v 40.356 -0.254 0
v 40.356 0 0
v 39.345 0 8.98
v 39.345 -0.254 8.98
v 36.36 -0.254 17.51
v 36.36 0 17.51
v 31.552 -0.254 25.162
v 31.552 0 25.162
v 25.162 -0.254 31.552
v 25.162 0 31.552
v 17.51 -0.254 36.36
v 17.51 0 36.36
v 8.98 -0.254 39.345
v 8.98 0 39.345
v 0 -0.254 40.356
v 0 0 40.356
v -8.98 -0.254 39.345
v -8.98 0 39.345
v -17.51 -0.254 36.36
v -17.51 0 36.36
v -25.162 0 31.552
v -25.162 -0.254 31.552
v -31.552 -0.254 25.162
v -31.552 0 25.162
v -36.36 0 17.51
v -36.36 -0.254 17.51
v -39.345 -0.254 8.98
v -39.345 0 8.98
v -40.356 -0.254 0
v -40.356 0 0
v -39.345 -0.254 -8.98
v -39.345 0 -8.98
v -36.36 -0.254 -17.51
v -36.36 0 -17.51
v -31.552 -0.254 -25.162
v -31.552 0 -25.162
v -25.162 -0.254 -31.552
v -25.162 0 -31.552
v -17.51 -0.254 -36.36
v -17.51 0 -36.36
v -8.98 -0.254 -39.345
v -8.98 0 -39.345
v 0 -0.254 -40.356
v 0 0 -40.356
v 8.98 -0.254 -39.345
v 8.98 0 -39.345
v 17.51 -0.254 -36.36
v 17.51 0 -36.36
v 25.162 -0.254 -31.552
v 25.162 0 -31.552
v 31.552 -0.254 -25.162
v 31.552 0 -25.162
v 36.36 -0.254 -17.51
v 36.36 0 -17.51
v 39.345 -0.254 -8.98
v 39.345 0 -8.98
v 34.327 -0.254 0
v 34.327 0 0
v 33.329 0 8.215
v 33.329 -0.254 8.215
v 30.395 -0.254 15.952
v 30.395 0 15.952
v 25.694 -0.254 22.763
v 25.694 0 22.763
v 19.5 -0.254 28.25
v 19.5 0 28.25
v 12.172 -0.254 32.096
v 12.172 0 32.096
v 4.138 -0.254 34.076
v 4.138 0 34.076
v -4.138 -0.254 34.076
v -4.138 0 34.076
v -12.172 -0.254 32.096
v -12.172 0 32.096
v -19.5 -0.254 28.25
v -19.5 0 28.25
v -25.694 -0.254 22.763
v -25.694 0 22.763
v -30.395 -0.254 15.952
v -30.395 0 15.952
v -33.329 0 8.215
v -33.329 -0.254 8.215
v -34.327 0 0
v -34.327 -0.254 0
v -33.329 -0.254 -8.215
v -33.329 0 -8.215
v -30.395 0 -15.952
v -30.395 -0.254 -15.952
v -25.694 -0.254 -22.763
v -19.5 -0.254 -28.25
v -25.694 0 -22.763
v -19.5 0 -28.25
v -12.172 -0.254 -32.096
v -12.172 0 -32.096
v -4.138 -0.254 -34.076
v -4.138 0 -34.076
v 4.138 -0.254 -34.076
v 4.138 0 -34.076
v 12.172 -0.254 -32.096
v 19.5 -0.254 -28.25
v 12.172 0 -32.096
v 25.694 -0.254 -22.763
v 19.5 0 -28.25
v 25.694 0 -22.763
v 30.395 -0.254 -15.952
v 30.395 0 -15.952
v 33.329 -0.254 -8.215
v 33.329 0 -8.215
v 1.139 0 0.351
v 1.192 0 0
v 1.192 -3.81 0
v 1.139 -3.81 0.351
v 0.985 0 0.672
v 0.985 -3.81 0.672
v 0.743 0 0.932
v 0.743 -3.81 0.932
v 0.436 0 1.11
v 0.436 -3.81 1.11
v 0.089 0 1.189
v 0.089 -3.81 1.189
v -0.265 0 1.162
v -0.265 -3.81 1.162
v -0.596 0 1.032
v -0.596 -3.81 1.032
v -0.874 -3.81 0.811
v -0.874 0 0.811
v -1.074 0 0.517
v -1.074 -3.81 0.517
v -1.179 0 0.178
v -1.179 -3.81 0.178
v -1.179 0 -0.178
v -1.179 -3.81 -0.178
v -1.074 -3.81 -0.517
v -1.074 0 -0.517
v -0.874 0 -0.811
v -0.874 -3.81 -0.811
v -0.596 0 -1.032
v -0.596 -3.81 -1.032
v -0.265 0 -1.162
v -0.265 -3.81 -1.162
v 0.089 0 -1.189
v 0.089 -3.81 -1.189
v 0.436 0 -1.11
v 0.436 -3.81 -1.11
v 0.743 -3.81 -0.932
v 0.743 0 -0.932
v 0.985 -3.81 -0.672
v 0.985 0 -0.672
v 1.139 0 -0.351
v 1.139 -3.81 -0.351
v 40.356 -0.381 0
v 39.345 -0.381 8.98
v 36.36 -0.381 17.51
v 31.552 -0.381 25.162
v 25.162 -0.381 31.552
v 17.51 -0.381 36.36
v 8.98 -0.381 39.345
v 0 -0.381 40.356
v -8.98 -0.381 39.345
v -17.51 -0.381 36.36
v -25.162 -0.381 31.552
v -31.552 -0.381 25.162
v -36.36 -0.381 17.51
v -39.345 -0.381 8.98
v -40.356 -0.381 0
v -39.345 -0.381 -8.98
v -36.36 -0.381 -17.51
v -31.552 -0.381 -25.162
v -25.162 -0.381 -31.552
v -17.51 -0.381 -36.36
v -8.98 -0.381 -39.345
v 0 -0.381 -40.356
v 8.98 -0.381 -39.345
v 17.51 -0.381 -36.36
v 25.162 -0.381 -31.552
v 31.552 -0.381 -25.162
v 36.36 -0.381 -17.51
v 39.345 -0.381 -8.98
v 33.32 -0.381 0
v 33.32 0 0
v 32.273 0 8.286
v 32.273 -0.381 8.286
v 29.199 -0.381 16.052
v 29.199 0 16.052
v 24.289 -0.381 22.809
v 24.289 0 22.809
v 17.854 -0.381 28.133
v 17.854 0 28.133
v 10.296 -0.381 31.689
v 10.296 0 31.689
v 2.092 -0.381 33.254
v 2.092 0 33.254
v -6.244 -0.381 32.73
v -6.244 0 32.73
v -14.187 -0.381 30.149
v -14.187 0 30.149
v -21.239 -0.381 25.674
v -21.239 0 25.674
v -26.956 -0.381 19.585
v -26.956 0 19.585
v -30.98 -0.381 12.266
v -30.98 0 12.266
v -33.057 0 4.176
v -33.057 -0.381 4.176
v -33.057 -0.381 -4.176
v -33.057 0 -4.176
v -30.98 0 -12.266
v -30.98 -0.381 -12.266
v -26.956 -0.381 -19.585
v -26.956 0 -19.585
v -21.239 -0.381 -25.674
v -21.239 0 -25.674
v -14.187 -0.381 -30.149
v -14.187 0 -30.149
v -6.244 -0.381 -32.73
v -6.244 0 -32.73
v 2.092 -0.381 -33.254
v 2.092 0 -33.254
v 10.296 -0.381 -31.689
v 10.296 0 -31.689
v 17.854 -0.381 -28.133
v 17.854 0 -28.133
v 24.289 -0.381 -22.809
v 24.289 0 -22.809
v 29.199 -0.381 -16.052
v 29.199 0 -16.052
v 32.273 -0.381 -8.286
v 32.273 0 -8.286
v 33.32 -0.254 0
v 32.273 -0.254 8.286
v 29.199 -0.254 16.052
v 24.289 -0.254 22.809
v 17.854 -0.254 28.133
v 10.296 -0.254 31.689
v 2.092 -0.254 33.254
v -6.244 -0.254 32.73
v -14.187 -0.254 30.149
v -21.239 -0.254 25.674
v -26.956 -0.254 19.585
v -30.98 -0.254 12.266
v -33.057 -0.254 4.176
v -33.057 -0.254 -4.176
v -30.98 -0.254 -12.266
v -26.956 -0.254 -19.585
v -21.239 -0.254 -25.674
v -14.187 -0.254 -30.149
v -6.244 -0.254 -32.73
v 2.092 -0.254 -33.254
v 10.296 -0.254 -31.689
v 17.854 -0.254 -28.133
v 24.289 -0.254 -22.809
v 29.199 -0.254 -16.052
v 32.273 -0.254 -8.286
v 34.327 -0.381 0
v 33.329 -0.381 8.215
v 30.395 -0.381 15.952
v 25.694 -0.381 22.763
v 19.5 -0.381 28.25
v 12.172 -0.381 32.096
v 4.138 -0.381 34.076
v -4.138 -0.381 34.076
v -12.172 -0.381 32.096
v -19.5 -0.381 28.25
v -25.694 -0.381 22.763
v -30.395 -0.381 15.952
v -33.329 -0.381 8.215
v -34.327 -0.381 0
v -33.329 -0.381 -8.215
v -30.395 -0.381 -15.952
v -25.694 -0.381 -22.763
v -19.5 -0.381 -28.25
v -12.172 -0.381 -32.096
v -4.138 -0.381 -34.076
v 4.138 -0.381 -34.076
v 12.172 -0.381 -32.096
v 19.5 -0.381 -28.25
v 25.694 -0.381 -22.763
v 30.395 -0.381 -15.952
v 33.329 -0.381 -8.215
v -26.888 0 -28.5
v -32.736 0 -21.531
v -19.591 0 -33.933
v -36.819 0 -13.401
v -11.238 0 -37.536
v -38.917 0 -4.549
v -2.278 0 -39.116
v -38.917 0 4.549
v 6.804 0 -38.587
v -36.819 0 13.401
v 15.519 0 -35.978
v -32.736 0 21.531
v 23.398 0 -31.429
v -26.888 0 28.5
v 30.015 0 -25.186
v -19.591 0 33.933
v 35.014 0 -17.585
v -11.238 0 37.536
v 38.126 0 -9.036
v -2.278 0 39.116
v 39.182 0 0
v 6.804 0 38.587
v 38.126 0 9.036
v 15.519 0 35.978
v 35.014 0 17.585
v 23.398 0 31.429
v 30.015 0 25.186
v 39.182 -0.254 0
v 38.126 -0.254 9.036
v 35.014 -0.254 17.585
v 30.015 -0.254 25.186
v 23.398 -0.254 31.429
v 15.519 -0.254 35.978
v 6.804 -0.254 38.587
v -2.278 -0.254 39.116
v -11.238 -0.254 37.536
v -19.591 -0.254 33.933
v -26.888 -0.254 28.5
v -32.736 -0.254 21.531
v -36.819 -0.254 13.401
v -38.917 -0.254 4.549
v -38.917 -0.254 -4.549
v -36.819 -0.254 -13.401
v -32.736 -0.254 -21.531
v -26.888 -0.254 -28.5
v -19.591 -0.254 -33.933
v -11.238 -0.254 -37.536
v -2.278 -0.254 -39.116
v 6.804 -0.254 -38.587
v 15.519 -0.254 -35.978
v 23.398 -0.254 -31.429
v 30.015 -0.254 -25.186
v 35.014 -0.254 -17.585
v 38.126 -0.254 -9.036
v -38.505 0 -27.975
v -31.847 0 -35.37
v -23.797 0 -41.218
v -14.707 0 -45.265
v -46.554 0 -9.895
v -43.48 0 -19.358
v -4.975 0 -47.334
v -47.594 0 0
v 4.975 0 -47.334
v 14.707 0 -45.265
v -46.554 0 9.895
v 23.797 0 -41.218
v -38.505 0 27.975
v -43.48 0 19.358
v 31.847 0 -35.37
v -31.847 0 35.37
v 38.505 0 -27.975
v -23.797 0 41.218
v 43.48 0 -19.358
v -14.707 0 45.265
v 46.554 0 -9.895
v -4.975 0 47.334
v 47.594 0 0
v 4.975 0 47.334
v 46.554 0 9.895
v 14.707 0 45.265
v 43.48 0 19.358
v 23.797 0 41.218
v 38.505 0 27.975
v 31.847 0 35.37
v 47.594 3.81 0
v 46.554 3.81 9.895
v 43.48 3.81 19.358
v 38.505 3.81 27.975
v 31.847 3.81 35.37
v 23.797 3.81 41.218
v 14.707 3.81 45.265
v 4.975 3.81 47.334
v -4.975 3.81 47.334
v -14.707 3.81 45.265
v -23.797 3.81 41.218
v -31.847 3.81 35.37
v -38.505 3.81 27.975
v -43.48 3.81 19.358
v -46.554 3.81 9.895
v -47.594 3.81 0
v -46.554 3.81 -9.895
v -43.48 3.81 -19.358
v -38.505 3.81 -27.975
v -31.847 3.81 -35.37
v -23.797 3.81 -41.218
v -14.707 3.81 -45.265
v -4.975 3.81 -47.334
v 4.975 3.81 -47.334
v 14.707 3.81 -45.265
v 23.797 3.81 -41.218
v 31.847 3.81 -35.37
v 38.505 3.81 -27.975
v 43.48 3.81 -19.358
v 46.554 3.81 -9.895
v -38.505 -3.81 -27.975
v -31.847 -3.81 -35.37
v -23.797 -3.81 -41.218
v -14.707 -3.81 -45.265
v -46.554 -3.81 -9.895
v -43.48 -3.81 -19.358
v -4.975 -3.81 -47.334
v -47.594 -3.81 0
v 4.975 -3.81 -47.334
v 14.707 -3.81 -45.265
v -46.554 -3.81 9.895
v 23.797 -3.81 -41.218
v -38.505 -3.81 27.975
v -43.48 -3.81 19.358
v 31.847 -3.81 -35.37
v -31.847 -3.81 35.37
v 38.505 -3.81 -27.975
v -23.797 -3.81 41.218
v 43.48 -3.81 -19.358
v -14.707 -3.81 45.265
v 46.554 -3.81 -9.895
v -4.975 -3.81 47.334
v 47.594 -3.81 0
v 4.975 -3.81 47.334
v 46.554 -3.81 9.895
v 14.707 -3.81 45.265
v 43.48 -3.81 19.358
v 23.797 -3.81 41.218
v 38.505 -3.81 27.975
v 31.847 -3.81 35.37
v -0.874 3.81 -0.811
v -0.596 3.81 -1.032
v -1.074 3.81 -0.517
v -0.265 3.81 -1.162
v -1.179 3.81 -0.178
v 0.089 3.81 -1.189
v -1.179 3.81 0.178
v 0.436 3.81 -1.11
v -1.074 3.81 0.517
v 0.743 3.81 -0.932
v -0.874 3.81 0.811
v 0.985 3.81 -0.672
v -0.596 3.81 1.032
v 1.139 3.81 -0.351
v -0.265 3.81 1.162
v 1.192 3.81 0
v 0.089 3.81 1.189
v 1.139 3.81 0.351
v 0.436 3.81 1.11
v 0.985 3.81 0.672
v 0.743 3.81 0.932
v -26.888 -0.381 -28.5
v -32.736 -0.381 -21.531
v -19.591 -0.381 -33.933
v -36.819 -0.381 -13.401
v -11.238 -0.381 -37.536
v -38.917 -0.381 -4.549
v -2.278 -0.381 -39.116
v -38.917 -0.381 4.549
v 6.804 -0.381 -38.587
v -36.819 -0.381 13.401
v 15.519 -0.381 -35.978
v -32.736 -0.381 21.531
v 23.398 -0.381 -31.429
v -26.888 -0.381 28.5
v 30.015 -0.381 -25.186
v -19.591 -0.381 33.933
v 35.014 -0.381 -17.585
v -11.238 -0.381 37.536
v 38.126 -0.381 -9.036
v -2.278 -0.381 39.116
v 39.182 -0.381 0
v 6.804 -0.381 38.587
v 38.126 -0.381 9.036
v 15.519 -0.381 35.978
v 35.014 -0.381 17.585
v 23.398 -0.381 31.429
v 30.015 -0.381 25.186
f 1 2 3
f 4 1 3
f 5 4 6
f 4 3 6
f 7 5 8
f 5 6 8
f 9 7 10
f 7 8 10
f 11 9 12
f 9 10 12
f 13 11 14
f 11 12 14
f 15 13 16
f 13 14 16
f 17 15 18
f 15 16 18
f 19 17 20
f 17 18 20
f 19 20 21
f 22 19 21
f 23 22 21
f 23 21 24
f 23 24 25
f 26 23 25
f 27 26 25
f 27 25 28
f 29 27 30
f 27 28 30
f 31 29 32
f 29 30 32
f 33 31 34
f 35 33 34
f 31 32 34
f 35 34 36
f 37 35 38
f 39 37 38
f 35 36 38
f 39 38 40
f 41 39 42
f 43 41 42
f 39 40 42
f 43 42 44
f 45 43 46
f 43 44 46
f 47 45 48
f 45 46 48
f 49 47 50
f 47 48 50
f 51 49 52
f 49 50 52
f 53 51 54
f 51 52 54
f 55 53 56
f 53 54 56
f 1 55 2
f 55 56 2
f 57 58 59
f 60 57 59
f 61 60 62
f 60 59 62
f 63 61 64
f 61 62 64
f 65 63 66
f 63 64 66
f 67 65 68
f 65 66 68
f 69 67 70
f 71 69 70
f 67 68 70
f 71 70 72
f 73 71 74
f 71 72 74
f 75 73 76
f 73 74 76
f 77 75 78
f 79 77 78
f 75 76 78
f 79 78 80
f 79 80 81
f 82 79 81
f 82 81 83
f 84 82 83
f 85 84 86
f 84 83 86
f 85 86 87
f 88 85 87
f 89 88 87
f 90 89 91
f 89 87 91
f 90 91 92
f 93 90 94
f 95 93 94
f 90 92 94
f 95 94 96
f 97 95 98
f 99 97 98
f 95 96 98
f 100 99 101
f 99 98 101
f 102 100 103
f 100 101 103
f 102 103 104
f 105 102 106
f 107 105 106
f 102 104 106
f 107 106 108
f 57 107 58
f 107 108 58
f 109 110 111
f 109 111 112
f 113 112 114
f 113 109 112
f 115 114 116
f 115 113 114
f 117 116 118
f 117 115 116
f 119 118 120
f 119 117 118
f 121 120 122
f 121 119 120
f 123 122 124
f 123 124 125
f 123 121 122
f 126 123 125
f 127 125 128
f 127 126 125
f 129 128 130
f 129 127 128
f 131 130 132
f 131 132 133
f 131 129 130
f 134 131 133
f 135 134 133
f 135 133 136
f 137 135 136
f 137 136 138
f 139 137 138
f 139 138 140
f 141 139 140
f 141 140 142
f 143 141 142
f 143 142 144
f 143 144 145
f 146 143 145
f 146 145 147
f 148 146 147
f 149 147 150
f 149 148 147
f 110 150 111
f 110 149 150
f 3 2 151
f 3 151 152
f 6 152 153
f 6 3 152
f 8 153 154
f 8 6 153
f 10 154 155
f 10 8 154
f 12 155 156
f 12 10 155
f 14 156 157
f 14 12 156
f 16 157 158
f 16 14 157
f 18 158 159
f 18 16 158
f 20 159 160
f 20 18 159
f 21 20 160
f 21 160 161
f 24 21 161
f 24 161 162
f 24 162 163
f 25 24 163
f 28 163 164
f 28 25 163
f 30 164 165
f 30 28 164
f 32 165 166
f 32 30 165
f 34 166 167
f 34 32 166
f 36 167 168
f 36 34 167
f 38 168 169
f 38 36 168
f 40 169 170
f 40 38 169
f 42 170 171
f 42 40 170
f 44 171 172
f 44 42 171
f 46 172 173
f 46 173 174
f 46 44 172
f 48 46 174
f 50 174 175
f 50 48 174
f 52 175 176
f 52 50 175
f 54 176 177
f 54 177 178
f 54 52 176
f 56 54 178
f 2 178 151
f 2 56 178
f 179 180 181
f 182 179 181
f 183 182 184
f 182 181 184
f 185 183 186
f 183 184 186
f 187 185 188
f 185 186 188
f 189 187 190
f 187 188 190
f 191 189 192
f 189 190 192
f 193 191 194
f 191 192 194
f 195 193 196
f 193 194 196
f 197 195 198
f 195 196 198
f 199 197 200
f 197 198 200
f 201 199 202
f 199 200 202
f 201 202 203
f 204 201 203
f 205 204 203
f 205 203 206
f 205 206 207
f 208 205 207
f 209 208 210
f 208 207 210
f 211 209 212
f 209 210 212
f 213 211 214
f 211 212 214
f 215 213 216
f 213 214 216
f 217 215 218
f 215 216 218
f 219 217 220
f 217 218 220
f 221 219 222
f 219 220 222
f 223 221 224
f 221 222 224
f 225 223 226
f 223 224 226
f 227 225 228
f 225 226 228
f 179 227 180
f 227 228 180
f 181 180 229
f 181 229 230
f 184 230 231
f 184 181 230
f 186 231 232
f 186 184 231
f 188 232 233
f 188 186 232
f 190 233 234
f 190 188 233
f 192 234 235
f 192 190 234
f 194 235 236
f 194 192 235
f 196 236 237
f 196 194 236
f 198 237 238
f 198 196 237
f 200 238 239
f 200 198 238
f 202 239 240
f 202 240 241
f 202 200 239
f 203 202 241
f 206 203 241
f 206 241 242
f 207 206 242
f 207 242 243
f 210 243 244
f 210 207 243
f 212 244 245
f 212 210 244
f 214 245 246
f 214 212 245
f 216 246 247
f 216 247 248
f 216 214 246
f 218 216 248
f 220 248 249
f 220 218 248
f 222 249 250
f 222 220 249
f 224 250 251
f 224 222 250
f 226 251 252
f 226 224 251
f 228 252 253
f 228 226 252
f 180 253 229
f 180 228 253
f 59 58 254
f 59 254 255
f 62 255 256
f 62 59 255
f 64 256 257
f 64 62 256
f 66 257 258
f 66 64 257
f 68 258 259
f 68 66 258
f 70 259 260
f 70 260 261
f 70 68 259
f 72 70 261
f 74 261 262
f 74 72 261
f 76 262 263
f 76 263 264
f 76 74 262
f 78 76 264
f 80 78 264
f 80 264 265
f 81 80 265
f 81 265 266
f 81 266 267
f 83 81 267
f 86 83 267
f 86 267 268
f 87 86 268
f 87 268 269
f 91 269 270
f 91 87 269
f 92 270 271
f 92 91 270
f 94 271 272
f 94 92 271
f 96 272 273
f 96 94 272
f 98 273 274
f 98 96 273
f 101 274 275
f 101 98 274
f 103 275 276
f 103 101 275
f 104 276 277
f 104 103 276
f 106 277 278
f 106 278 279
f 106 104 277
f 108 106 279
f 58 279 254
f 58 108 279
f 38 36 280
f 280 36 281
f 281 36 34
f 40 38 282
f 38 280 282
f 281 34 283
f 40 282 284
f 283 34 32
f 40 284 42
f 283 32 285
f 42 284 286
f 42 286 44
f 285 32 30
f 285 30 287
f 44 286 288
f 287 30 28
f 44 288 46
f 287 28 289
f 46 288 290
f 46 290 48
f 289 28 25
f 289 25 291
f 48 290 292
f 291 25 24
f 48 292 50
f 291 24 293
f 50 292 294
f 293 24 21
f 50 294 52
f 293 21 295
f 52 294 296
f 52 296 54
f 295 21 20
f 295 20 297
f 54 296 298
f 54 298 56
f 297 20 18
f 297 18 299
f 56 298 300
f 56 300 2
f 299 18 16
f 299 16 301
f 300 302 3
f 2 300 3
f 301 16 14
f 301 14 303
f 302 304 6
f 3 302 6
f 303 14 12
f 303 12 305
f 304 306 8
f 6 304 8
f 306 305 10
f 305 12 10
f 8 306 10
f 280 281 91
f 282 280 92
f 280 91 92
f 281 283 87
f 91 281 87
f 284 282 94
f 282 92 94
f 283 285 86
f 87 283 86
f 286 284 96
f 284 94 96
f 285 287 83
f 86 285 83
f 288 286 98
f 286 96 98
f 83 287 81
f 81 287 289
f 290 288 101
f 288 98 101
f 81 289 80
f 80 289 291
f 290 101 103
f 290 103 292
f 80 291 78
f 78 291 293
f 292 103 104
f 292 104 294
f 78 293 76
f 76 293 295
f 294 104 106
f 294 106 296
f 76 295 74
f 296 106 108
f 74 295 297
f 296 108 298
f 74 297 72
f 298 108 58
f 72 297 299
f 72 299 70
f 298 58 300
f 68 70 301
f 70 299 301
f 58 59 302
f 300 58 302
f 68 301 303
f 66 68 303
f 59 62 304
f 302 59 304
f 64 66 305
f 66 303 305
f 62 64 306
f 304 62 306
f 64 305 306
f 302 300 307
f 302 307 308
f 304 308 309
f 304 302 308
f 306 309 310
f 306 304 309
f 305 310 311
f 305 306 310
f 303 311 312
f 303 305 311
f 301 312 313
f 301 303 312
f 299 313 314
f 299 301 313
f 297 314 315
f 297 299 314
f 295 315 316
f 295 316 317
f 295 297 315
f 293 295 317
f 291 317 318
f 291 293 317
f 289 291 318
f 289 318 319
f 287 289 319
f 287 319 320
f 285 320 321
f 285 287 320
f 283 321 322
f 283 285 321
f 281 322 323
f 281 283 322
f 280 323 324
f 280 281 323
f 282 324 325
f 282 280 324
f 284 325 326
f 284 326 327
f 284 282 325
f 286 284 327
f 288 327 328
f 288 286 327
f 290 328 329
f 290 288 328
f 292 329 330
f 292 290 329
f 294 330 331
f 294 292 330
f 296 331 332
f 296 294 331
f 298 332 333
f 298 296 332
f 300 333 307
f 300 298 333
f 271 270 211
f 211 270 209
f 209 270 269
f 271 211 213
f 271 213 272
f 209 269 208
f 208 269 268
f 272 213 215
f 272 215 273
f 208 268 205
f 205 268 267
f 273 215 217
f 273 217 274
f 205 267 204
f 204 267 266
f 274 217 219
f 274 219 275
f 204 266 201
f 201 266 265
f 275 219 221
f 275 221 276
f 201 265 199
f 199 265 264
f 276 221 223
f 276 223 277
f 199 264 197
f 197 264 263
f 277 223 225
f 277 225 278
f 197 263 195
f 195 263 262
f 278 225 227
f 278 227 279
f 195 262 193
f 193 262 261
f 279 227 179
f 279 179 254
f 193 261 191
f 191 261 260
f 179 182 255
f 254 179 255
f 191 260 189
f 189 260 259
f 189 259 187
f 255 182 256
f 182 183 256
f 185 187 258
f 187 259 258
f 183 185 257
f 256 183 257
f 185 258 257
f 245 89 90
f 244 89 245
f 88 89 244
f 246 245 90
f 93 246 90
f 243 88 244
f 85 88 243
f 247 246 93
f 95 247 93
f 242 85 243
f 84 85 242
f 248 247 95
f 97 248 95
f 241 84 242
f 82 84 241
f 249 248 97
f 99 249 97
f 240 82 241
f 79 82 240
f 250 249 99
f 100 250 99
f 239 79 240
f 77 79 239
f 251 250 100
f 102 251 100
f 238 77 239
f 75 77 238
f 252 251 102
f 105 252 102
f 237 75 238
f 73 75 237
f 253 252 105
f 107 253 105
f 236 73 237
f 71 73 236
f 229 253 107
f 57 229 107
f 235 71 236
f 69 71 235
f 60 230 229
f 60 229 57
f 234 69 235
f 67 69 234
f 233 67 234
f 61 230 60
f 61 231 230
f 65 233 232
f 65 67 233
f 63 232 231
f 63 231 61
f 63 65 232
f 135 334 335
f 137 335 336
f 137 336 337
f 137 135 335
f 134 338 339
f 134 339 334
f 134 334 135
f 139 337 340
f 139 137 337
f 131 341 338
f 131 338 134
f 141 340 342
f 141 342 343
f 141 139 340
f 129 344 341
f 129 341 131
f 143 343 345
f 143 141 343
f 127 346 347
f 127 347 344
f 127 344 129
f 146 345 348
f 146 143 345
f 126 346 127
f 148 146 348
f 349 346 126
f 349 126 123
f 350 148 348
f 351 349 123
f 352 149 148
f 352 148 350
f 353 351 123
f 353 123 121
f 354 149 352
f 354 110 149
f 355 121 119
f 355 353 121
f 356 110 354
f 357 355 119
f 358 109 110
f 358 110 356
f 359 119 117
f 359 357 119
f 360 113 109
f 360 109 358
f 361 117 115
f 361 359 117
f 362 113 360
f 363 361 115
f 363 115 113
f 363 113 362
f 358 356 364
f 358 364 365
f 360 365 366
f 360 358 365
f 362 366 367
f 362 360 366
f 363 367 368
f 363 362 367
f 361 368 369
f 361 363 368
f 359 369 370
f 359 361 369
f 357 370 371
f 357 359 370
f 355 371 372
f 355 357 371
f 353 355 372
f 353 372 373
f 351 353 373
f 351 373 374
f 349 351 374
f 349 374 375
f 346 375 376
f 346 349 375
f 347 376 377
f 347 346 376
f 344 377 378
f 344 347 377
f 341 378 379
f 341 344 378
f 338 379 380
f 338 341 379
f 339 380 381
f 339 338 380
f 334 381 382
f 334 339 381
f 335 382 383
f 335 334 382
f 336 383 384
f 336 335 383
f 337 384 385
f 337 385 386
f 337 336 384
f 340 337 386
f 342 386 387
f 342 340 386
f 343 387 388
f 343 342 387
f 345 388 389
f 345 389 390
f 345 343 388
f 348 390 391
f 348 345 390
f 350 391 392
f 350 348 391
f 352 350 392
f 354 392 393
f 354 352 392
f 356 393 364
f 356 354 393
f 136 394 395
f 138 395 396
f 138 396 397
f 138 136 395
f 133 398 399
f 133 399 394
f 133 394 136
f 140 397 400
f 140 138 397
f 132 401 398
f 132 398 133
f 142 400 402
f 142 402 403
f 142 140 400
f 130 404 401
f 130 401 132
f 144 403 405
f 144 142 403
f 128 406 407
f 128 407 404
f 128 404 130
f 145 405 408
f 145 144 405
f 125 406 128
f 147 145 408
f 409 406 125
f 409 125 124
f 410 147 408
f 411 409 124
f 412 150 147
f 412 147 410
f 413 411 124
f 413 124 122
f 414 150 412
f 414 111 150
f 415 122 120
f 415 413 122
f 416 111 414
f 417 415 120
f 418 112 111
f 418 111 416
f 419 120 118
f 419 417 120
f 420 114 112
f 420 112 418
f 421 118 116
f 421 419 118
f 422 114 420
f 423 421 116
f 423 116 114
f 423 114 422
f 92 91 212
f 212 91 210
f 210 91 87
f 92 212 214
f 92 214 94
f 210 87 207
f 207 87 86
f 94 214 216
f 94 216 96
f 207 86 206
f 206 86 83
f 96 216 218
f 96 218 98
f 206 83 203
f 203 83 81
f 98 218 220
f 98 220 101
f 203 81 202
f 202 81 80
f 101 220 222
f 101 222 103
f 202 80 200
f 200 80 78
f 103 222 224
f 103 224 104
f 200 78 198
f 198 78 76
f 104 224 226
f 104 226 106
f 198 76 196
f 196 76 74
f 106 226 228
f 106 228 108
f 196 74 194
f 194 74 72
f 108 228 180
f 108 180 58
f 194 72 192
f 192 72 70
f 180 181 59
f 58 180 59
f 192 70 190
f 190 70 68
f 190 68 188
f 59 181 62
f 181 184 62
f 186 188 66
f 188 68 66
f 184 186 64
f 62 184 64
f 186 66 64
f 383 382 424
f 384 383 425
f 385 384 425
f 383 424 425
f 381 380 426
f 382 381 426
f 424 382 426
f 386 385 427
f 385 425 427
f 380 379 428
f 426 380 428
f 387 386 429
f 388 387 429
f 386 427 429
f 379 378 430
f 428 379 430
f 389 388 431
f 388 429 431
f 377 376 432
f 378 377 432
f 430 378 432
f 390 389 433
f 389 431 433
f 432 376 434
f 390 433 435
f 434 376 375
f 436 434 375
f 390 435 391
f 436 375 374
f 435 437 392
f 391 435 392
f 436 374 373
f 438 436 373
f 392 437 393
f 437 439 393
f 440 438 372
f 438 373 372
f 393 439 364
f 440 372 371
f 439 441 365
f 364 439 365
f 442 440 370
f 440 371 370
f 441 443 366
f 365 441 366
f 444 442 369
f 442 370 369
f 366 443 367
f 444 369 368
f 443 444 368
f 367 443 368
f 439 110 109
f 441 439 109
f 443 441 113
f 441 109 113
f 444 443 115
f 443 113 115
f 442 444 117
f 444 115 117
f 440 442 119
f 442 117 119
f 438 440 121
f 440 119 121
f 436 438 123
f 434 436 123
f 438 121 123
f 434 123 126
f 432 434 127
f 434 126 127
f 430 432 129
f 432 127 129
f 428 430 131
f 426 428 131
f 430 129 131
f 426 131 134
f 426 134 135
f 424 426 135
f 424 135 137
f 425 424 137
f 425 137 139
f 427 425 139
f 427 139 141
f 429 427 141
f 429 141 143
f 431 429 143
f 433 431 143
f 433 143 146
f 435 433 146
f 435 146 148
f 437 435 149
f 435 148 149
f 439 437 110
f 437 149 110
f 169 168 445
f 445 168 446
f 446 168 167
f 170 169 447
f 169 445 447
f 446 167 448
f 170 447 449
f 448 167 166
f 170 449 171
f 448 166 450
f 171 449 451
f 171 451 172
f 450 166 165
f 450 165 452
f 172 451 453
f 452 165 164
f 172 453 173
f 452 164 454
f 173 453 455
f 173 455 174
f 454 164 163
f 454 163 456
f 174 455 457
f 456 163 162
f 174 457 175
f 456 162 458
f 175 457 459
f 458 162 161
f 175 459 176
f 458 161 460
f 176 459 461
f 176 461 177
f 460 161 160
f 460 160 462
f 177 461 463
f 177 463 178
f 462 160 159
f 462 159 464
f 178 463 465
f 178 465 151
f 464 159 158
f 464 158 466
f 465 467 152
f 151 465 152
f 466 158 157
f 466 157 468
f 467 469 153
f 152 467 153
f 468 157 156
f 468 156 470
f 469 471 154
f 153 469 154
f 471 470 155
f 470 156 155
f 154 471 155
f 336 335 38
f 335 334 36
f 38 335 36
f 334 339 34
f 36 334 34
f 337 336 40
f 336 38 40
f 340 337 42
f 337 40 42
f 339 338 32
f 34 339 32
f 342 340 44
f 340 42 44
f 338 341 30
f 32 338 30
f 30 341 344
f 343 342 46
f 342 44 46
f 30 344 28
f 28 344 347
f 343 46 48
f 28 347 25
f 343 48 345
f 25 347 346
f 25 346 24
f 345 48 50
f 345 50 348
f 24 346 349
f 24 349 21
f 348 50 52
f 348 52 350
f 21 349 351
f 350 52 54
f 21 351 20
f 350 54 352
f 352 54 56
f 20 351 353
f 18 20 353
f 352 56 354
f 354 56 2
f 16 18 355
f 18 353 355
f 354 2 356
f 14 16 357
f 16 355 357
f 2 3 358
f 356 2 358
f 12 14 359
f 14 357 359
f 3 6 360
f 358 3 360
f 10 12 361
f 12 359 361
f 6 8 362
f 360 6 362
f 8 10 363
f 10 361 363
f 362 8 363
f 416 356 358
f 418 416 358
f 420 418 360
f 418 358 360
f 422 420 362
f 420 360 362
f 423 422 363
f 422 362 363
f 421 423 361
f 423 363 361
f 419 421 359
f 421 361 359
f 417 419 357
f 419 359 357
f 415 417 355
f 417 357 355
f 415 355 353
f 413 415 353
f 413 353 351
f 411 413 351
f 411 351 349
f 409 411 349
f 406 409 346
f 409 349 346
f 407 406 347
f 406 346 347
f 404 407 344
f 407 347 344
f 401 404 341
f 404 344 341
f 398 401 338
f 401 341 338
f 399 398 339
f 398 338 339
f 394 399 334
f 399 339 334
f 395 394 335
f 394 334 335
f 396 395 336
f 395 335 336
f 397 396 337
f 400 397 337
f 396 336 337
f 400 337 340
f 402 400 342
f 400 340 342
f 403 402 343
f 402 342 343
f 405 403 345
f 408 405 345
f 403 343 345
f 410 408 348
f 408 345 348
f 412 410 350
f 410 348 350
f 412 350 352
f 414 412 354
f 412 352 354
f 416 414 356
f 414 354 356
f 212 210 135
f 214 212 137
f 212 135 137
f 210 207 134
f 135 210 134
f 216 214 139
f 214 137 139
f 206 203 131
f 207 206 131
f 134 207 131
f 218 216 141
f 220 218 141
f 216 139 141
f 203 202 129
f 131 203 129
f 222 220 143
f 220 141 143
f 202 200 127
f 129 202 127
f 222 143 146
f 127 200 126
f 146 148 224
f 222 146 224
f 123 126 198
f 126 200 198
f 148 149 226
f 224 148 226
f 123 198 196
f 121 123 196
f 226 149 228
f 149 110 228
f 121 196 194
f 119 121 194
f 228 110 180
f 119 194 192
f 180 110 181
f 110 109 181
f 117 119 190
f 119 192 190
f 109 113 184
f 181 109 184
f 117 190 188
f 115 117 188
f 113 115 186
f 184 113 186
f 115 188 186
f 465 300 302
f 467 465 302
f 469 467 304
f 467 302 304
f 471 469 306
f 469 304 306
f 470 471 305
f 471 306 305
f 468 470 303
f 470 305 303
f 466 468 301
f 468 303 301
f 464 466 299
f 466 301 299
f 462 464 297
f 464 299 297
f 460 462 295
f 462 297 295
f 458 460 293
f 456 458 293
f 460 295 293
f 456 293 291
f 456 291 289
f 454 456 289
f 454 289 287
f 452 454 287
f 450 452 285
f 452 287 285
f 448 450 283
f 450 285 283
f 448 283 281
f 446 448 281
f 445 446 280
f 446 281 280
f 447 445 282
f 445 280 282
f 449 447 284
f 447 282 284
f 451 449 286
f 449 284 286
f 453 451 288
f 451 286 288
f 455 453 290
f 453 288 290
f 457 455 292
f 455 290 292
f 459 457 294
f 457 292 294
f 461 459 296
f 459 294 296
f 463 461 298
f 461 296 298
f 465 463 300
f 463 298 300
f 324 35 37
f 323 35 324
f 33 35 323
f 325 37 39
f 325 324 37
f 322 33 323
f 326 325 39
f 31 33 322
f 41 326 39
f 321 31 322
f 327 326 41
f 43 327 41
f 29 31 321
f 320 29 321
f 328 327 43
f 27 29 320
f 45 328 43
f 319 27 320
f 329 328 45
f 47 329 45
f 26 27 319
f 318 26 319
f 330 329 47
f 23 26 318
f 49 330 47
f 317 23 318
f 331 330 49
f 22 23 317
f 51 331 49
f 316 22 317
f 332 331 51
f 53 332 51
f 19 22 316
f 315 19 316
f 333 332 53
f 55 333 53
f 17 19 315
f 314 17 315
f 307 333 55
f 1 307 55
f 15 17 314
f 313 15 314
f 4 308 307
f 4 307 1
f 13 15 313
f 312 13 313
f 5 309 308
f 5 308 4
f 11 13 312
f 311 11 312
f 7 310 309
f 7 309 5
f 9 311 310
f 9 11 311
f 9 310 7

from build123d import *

# Parameters (mm, degrees)
F0_R     = 40.3563306145
F0_R_2   = 39.182154103
F1_DEPTH = 0.254
F0_R_3   = 34.3266525065
F0_R_4   = 33.3199988615
F0_R_5   = 47.5944326974
F0_R_6   = 1.1922054774
F2_DEPTH = 3.81
F3_DEPTH = 3.81
F4_DEPTH = 0.381


with BuildPart() as f1:
    # F0 (on Front) → F1 (new body)
    with BuildSketch(Plane.XZ):
        Circle(F0_R)
        Circle(F0_R_2, mode=Mode.SUBTRACT)
    extrude(amount=F1_DEPTH)


with BuildPart() as f1b:
    # F0 (on Front) → F1, piece 2 (new body)
    with BuildSketch(Plane.XZ):
        Circle(F0_R_3)
        Circle(F0_R_4, mode=Mode.SUBTRACT)
    extrude(amount=F1_DEPTH)


with BuildPart() as f2:
    # F0 (on Front) → F2 (new body)
    with BuildSketch(Plane.XZ):
        Circle(F0_R_5)
        Circle(F0_R, mode=Mode.SUBTRACT)
        Circle(F0_R)
        Circle(F0_R_2, mode=Mode.SUBTRACT)
        Circle(F0_R_2)
        Circle(F0_R_3, mode=Mode.SUBTRACT)
        Circle(F0_R_3)
        Circle(F0_R_4, mode=Mode.SUBTRACT)
        Circle(F0_R_4)
        Circle(F0_R_6, mode=Mode.SUBTRACT)
    extrude(amount=-F2_DEPTH)


with BuildPart() as f3:
    # F0 (on Front) → F3 (new body)
    with BuildSketch(Plane.XZ):
        Circle(F0_R_5)
        Circle(F0_R, mode=Mode.SUBTRACT)
        Circle(F0_R)
        Circle(F0_R_2, mode=Mode.SUBTRACT)
        Circle(F0_R_2)
        Circle(F0_R_3, mode=Mode.SUBTRACT)
        Circle(F0_R_3)
        Circle(F0_R_4, mode=Mode.SUBTRACT)
        Circle(F0_R_4)
        Circle(F0_R_6, mode=Mode.SUBTRACT)
    extrude(amount=F3_DEPTH)


with BuildPart() as f4:
    # F0 (on Front) → F4 (new body)
    with BuildSketch(Plane.XZ):
        Circle(F0_R)
        Circle(F0_R_2, mode=Mode.SUBTRACT)
    extrude(amount=F4_DEPTH)


with BuildPart() as f4b:
    # F0 (on Front) → F4, piece 2 (new body)
    with BuildSketch(Plane.XZ):
        Circle(F0_R_3)
        Circle(F0_R_4, mode=Mode.SUBTRACT)
    extrude(amount=F4_DEPTH)


with BuildPart() as f3_1:
    add(f3.part)

    # F5: cut F4
    add(f4.part, mode=Mode.SUBTRACT)

    # F6: cut F4b
    add(f4b.part, mode=Mode.SUBTRACT)


solid = Compound([f1.part, f1b.part, f2.part, f3_1.part])
